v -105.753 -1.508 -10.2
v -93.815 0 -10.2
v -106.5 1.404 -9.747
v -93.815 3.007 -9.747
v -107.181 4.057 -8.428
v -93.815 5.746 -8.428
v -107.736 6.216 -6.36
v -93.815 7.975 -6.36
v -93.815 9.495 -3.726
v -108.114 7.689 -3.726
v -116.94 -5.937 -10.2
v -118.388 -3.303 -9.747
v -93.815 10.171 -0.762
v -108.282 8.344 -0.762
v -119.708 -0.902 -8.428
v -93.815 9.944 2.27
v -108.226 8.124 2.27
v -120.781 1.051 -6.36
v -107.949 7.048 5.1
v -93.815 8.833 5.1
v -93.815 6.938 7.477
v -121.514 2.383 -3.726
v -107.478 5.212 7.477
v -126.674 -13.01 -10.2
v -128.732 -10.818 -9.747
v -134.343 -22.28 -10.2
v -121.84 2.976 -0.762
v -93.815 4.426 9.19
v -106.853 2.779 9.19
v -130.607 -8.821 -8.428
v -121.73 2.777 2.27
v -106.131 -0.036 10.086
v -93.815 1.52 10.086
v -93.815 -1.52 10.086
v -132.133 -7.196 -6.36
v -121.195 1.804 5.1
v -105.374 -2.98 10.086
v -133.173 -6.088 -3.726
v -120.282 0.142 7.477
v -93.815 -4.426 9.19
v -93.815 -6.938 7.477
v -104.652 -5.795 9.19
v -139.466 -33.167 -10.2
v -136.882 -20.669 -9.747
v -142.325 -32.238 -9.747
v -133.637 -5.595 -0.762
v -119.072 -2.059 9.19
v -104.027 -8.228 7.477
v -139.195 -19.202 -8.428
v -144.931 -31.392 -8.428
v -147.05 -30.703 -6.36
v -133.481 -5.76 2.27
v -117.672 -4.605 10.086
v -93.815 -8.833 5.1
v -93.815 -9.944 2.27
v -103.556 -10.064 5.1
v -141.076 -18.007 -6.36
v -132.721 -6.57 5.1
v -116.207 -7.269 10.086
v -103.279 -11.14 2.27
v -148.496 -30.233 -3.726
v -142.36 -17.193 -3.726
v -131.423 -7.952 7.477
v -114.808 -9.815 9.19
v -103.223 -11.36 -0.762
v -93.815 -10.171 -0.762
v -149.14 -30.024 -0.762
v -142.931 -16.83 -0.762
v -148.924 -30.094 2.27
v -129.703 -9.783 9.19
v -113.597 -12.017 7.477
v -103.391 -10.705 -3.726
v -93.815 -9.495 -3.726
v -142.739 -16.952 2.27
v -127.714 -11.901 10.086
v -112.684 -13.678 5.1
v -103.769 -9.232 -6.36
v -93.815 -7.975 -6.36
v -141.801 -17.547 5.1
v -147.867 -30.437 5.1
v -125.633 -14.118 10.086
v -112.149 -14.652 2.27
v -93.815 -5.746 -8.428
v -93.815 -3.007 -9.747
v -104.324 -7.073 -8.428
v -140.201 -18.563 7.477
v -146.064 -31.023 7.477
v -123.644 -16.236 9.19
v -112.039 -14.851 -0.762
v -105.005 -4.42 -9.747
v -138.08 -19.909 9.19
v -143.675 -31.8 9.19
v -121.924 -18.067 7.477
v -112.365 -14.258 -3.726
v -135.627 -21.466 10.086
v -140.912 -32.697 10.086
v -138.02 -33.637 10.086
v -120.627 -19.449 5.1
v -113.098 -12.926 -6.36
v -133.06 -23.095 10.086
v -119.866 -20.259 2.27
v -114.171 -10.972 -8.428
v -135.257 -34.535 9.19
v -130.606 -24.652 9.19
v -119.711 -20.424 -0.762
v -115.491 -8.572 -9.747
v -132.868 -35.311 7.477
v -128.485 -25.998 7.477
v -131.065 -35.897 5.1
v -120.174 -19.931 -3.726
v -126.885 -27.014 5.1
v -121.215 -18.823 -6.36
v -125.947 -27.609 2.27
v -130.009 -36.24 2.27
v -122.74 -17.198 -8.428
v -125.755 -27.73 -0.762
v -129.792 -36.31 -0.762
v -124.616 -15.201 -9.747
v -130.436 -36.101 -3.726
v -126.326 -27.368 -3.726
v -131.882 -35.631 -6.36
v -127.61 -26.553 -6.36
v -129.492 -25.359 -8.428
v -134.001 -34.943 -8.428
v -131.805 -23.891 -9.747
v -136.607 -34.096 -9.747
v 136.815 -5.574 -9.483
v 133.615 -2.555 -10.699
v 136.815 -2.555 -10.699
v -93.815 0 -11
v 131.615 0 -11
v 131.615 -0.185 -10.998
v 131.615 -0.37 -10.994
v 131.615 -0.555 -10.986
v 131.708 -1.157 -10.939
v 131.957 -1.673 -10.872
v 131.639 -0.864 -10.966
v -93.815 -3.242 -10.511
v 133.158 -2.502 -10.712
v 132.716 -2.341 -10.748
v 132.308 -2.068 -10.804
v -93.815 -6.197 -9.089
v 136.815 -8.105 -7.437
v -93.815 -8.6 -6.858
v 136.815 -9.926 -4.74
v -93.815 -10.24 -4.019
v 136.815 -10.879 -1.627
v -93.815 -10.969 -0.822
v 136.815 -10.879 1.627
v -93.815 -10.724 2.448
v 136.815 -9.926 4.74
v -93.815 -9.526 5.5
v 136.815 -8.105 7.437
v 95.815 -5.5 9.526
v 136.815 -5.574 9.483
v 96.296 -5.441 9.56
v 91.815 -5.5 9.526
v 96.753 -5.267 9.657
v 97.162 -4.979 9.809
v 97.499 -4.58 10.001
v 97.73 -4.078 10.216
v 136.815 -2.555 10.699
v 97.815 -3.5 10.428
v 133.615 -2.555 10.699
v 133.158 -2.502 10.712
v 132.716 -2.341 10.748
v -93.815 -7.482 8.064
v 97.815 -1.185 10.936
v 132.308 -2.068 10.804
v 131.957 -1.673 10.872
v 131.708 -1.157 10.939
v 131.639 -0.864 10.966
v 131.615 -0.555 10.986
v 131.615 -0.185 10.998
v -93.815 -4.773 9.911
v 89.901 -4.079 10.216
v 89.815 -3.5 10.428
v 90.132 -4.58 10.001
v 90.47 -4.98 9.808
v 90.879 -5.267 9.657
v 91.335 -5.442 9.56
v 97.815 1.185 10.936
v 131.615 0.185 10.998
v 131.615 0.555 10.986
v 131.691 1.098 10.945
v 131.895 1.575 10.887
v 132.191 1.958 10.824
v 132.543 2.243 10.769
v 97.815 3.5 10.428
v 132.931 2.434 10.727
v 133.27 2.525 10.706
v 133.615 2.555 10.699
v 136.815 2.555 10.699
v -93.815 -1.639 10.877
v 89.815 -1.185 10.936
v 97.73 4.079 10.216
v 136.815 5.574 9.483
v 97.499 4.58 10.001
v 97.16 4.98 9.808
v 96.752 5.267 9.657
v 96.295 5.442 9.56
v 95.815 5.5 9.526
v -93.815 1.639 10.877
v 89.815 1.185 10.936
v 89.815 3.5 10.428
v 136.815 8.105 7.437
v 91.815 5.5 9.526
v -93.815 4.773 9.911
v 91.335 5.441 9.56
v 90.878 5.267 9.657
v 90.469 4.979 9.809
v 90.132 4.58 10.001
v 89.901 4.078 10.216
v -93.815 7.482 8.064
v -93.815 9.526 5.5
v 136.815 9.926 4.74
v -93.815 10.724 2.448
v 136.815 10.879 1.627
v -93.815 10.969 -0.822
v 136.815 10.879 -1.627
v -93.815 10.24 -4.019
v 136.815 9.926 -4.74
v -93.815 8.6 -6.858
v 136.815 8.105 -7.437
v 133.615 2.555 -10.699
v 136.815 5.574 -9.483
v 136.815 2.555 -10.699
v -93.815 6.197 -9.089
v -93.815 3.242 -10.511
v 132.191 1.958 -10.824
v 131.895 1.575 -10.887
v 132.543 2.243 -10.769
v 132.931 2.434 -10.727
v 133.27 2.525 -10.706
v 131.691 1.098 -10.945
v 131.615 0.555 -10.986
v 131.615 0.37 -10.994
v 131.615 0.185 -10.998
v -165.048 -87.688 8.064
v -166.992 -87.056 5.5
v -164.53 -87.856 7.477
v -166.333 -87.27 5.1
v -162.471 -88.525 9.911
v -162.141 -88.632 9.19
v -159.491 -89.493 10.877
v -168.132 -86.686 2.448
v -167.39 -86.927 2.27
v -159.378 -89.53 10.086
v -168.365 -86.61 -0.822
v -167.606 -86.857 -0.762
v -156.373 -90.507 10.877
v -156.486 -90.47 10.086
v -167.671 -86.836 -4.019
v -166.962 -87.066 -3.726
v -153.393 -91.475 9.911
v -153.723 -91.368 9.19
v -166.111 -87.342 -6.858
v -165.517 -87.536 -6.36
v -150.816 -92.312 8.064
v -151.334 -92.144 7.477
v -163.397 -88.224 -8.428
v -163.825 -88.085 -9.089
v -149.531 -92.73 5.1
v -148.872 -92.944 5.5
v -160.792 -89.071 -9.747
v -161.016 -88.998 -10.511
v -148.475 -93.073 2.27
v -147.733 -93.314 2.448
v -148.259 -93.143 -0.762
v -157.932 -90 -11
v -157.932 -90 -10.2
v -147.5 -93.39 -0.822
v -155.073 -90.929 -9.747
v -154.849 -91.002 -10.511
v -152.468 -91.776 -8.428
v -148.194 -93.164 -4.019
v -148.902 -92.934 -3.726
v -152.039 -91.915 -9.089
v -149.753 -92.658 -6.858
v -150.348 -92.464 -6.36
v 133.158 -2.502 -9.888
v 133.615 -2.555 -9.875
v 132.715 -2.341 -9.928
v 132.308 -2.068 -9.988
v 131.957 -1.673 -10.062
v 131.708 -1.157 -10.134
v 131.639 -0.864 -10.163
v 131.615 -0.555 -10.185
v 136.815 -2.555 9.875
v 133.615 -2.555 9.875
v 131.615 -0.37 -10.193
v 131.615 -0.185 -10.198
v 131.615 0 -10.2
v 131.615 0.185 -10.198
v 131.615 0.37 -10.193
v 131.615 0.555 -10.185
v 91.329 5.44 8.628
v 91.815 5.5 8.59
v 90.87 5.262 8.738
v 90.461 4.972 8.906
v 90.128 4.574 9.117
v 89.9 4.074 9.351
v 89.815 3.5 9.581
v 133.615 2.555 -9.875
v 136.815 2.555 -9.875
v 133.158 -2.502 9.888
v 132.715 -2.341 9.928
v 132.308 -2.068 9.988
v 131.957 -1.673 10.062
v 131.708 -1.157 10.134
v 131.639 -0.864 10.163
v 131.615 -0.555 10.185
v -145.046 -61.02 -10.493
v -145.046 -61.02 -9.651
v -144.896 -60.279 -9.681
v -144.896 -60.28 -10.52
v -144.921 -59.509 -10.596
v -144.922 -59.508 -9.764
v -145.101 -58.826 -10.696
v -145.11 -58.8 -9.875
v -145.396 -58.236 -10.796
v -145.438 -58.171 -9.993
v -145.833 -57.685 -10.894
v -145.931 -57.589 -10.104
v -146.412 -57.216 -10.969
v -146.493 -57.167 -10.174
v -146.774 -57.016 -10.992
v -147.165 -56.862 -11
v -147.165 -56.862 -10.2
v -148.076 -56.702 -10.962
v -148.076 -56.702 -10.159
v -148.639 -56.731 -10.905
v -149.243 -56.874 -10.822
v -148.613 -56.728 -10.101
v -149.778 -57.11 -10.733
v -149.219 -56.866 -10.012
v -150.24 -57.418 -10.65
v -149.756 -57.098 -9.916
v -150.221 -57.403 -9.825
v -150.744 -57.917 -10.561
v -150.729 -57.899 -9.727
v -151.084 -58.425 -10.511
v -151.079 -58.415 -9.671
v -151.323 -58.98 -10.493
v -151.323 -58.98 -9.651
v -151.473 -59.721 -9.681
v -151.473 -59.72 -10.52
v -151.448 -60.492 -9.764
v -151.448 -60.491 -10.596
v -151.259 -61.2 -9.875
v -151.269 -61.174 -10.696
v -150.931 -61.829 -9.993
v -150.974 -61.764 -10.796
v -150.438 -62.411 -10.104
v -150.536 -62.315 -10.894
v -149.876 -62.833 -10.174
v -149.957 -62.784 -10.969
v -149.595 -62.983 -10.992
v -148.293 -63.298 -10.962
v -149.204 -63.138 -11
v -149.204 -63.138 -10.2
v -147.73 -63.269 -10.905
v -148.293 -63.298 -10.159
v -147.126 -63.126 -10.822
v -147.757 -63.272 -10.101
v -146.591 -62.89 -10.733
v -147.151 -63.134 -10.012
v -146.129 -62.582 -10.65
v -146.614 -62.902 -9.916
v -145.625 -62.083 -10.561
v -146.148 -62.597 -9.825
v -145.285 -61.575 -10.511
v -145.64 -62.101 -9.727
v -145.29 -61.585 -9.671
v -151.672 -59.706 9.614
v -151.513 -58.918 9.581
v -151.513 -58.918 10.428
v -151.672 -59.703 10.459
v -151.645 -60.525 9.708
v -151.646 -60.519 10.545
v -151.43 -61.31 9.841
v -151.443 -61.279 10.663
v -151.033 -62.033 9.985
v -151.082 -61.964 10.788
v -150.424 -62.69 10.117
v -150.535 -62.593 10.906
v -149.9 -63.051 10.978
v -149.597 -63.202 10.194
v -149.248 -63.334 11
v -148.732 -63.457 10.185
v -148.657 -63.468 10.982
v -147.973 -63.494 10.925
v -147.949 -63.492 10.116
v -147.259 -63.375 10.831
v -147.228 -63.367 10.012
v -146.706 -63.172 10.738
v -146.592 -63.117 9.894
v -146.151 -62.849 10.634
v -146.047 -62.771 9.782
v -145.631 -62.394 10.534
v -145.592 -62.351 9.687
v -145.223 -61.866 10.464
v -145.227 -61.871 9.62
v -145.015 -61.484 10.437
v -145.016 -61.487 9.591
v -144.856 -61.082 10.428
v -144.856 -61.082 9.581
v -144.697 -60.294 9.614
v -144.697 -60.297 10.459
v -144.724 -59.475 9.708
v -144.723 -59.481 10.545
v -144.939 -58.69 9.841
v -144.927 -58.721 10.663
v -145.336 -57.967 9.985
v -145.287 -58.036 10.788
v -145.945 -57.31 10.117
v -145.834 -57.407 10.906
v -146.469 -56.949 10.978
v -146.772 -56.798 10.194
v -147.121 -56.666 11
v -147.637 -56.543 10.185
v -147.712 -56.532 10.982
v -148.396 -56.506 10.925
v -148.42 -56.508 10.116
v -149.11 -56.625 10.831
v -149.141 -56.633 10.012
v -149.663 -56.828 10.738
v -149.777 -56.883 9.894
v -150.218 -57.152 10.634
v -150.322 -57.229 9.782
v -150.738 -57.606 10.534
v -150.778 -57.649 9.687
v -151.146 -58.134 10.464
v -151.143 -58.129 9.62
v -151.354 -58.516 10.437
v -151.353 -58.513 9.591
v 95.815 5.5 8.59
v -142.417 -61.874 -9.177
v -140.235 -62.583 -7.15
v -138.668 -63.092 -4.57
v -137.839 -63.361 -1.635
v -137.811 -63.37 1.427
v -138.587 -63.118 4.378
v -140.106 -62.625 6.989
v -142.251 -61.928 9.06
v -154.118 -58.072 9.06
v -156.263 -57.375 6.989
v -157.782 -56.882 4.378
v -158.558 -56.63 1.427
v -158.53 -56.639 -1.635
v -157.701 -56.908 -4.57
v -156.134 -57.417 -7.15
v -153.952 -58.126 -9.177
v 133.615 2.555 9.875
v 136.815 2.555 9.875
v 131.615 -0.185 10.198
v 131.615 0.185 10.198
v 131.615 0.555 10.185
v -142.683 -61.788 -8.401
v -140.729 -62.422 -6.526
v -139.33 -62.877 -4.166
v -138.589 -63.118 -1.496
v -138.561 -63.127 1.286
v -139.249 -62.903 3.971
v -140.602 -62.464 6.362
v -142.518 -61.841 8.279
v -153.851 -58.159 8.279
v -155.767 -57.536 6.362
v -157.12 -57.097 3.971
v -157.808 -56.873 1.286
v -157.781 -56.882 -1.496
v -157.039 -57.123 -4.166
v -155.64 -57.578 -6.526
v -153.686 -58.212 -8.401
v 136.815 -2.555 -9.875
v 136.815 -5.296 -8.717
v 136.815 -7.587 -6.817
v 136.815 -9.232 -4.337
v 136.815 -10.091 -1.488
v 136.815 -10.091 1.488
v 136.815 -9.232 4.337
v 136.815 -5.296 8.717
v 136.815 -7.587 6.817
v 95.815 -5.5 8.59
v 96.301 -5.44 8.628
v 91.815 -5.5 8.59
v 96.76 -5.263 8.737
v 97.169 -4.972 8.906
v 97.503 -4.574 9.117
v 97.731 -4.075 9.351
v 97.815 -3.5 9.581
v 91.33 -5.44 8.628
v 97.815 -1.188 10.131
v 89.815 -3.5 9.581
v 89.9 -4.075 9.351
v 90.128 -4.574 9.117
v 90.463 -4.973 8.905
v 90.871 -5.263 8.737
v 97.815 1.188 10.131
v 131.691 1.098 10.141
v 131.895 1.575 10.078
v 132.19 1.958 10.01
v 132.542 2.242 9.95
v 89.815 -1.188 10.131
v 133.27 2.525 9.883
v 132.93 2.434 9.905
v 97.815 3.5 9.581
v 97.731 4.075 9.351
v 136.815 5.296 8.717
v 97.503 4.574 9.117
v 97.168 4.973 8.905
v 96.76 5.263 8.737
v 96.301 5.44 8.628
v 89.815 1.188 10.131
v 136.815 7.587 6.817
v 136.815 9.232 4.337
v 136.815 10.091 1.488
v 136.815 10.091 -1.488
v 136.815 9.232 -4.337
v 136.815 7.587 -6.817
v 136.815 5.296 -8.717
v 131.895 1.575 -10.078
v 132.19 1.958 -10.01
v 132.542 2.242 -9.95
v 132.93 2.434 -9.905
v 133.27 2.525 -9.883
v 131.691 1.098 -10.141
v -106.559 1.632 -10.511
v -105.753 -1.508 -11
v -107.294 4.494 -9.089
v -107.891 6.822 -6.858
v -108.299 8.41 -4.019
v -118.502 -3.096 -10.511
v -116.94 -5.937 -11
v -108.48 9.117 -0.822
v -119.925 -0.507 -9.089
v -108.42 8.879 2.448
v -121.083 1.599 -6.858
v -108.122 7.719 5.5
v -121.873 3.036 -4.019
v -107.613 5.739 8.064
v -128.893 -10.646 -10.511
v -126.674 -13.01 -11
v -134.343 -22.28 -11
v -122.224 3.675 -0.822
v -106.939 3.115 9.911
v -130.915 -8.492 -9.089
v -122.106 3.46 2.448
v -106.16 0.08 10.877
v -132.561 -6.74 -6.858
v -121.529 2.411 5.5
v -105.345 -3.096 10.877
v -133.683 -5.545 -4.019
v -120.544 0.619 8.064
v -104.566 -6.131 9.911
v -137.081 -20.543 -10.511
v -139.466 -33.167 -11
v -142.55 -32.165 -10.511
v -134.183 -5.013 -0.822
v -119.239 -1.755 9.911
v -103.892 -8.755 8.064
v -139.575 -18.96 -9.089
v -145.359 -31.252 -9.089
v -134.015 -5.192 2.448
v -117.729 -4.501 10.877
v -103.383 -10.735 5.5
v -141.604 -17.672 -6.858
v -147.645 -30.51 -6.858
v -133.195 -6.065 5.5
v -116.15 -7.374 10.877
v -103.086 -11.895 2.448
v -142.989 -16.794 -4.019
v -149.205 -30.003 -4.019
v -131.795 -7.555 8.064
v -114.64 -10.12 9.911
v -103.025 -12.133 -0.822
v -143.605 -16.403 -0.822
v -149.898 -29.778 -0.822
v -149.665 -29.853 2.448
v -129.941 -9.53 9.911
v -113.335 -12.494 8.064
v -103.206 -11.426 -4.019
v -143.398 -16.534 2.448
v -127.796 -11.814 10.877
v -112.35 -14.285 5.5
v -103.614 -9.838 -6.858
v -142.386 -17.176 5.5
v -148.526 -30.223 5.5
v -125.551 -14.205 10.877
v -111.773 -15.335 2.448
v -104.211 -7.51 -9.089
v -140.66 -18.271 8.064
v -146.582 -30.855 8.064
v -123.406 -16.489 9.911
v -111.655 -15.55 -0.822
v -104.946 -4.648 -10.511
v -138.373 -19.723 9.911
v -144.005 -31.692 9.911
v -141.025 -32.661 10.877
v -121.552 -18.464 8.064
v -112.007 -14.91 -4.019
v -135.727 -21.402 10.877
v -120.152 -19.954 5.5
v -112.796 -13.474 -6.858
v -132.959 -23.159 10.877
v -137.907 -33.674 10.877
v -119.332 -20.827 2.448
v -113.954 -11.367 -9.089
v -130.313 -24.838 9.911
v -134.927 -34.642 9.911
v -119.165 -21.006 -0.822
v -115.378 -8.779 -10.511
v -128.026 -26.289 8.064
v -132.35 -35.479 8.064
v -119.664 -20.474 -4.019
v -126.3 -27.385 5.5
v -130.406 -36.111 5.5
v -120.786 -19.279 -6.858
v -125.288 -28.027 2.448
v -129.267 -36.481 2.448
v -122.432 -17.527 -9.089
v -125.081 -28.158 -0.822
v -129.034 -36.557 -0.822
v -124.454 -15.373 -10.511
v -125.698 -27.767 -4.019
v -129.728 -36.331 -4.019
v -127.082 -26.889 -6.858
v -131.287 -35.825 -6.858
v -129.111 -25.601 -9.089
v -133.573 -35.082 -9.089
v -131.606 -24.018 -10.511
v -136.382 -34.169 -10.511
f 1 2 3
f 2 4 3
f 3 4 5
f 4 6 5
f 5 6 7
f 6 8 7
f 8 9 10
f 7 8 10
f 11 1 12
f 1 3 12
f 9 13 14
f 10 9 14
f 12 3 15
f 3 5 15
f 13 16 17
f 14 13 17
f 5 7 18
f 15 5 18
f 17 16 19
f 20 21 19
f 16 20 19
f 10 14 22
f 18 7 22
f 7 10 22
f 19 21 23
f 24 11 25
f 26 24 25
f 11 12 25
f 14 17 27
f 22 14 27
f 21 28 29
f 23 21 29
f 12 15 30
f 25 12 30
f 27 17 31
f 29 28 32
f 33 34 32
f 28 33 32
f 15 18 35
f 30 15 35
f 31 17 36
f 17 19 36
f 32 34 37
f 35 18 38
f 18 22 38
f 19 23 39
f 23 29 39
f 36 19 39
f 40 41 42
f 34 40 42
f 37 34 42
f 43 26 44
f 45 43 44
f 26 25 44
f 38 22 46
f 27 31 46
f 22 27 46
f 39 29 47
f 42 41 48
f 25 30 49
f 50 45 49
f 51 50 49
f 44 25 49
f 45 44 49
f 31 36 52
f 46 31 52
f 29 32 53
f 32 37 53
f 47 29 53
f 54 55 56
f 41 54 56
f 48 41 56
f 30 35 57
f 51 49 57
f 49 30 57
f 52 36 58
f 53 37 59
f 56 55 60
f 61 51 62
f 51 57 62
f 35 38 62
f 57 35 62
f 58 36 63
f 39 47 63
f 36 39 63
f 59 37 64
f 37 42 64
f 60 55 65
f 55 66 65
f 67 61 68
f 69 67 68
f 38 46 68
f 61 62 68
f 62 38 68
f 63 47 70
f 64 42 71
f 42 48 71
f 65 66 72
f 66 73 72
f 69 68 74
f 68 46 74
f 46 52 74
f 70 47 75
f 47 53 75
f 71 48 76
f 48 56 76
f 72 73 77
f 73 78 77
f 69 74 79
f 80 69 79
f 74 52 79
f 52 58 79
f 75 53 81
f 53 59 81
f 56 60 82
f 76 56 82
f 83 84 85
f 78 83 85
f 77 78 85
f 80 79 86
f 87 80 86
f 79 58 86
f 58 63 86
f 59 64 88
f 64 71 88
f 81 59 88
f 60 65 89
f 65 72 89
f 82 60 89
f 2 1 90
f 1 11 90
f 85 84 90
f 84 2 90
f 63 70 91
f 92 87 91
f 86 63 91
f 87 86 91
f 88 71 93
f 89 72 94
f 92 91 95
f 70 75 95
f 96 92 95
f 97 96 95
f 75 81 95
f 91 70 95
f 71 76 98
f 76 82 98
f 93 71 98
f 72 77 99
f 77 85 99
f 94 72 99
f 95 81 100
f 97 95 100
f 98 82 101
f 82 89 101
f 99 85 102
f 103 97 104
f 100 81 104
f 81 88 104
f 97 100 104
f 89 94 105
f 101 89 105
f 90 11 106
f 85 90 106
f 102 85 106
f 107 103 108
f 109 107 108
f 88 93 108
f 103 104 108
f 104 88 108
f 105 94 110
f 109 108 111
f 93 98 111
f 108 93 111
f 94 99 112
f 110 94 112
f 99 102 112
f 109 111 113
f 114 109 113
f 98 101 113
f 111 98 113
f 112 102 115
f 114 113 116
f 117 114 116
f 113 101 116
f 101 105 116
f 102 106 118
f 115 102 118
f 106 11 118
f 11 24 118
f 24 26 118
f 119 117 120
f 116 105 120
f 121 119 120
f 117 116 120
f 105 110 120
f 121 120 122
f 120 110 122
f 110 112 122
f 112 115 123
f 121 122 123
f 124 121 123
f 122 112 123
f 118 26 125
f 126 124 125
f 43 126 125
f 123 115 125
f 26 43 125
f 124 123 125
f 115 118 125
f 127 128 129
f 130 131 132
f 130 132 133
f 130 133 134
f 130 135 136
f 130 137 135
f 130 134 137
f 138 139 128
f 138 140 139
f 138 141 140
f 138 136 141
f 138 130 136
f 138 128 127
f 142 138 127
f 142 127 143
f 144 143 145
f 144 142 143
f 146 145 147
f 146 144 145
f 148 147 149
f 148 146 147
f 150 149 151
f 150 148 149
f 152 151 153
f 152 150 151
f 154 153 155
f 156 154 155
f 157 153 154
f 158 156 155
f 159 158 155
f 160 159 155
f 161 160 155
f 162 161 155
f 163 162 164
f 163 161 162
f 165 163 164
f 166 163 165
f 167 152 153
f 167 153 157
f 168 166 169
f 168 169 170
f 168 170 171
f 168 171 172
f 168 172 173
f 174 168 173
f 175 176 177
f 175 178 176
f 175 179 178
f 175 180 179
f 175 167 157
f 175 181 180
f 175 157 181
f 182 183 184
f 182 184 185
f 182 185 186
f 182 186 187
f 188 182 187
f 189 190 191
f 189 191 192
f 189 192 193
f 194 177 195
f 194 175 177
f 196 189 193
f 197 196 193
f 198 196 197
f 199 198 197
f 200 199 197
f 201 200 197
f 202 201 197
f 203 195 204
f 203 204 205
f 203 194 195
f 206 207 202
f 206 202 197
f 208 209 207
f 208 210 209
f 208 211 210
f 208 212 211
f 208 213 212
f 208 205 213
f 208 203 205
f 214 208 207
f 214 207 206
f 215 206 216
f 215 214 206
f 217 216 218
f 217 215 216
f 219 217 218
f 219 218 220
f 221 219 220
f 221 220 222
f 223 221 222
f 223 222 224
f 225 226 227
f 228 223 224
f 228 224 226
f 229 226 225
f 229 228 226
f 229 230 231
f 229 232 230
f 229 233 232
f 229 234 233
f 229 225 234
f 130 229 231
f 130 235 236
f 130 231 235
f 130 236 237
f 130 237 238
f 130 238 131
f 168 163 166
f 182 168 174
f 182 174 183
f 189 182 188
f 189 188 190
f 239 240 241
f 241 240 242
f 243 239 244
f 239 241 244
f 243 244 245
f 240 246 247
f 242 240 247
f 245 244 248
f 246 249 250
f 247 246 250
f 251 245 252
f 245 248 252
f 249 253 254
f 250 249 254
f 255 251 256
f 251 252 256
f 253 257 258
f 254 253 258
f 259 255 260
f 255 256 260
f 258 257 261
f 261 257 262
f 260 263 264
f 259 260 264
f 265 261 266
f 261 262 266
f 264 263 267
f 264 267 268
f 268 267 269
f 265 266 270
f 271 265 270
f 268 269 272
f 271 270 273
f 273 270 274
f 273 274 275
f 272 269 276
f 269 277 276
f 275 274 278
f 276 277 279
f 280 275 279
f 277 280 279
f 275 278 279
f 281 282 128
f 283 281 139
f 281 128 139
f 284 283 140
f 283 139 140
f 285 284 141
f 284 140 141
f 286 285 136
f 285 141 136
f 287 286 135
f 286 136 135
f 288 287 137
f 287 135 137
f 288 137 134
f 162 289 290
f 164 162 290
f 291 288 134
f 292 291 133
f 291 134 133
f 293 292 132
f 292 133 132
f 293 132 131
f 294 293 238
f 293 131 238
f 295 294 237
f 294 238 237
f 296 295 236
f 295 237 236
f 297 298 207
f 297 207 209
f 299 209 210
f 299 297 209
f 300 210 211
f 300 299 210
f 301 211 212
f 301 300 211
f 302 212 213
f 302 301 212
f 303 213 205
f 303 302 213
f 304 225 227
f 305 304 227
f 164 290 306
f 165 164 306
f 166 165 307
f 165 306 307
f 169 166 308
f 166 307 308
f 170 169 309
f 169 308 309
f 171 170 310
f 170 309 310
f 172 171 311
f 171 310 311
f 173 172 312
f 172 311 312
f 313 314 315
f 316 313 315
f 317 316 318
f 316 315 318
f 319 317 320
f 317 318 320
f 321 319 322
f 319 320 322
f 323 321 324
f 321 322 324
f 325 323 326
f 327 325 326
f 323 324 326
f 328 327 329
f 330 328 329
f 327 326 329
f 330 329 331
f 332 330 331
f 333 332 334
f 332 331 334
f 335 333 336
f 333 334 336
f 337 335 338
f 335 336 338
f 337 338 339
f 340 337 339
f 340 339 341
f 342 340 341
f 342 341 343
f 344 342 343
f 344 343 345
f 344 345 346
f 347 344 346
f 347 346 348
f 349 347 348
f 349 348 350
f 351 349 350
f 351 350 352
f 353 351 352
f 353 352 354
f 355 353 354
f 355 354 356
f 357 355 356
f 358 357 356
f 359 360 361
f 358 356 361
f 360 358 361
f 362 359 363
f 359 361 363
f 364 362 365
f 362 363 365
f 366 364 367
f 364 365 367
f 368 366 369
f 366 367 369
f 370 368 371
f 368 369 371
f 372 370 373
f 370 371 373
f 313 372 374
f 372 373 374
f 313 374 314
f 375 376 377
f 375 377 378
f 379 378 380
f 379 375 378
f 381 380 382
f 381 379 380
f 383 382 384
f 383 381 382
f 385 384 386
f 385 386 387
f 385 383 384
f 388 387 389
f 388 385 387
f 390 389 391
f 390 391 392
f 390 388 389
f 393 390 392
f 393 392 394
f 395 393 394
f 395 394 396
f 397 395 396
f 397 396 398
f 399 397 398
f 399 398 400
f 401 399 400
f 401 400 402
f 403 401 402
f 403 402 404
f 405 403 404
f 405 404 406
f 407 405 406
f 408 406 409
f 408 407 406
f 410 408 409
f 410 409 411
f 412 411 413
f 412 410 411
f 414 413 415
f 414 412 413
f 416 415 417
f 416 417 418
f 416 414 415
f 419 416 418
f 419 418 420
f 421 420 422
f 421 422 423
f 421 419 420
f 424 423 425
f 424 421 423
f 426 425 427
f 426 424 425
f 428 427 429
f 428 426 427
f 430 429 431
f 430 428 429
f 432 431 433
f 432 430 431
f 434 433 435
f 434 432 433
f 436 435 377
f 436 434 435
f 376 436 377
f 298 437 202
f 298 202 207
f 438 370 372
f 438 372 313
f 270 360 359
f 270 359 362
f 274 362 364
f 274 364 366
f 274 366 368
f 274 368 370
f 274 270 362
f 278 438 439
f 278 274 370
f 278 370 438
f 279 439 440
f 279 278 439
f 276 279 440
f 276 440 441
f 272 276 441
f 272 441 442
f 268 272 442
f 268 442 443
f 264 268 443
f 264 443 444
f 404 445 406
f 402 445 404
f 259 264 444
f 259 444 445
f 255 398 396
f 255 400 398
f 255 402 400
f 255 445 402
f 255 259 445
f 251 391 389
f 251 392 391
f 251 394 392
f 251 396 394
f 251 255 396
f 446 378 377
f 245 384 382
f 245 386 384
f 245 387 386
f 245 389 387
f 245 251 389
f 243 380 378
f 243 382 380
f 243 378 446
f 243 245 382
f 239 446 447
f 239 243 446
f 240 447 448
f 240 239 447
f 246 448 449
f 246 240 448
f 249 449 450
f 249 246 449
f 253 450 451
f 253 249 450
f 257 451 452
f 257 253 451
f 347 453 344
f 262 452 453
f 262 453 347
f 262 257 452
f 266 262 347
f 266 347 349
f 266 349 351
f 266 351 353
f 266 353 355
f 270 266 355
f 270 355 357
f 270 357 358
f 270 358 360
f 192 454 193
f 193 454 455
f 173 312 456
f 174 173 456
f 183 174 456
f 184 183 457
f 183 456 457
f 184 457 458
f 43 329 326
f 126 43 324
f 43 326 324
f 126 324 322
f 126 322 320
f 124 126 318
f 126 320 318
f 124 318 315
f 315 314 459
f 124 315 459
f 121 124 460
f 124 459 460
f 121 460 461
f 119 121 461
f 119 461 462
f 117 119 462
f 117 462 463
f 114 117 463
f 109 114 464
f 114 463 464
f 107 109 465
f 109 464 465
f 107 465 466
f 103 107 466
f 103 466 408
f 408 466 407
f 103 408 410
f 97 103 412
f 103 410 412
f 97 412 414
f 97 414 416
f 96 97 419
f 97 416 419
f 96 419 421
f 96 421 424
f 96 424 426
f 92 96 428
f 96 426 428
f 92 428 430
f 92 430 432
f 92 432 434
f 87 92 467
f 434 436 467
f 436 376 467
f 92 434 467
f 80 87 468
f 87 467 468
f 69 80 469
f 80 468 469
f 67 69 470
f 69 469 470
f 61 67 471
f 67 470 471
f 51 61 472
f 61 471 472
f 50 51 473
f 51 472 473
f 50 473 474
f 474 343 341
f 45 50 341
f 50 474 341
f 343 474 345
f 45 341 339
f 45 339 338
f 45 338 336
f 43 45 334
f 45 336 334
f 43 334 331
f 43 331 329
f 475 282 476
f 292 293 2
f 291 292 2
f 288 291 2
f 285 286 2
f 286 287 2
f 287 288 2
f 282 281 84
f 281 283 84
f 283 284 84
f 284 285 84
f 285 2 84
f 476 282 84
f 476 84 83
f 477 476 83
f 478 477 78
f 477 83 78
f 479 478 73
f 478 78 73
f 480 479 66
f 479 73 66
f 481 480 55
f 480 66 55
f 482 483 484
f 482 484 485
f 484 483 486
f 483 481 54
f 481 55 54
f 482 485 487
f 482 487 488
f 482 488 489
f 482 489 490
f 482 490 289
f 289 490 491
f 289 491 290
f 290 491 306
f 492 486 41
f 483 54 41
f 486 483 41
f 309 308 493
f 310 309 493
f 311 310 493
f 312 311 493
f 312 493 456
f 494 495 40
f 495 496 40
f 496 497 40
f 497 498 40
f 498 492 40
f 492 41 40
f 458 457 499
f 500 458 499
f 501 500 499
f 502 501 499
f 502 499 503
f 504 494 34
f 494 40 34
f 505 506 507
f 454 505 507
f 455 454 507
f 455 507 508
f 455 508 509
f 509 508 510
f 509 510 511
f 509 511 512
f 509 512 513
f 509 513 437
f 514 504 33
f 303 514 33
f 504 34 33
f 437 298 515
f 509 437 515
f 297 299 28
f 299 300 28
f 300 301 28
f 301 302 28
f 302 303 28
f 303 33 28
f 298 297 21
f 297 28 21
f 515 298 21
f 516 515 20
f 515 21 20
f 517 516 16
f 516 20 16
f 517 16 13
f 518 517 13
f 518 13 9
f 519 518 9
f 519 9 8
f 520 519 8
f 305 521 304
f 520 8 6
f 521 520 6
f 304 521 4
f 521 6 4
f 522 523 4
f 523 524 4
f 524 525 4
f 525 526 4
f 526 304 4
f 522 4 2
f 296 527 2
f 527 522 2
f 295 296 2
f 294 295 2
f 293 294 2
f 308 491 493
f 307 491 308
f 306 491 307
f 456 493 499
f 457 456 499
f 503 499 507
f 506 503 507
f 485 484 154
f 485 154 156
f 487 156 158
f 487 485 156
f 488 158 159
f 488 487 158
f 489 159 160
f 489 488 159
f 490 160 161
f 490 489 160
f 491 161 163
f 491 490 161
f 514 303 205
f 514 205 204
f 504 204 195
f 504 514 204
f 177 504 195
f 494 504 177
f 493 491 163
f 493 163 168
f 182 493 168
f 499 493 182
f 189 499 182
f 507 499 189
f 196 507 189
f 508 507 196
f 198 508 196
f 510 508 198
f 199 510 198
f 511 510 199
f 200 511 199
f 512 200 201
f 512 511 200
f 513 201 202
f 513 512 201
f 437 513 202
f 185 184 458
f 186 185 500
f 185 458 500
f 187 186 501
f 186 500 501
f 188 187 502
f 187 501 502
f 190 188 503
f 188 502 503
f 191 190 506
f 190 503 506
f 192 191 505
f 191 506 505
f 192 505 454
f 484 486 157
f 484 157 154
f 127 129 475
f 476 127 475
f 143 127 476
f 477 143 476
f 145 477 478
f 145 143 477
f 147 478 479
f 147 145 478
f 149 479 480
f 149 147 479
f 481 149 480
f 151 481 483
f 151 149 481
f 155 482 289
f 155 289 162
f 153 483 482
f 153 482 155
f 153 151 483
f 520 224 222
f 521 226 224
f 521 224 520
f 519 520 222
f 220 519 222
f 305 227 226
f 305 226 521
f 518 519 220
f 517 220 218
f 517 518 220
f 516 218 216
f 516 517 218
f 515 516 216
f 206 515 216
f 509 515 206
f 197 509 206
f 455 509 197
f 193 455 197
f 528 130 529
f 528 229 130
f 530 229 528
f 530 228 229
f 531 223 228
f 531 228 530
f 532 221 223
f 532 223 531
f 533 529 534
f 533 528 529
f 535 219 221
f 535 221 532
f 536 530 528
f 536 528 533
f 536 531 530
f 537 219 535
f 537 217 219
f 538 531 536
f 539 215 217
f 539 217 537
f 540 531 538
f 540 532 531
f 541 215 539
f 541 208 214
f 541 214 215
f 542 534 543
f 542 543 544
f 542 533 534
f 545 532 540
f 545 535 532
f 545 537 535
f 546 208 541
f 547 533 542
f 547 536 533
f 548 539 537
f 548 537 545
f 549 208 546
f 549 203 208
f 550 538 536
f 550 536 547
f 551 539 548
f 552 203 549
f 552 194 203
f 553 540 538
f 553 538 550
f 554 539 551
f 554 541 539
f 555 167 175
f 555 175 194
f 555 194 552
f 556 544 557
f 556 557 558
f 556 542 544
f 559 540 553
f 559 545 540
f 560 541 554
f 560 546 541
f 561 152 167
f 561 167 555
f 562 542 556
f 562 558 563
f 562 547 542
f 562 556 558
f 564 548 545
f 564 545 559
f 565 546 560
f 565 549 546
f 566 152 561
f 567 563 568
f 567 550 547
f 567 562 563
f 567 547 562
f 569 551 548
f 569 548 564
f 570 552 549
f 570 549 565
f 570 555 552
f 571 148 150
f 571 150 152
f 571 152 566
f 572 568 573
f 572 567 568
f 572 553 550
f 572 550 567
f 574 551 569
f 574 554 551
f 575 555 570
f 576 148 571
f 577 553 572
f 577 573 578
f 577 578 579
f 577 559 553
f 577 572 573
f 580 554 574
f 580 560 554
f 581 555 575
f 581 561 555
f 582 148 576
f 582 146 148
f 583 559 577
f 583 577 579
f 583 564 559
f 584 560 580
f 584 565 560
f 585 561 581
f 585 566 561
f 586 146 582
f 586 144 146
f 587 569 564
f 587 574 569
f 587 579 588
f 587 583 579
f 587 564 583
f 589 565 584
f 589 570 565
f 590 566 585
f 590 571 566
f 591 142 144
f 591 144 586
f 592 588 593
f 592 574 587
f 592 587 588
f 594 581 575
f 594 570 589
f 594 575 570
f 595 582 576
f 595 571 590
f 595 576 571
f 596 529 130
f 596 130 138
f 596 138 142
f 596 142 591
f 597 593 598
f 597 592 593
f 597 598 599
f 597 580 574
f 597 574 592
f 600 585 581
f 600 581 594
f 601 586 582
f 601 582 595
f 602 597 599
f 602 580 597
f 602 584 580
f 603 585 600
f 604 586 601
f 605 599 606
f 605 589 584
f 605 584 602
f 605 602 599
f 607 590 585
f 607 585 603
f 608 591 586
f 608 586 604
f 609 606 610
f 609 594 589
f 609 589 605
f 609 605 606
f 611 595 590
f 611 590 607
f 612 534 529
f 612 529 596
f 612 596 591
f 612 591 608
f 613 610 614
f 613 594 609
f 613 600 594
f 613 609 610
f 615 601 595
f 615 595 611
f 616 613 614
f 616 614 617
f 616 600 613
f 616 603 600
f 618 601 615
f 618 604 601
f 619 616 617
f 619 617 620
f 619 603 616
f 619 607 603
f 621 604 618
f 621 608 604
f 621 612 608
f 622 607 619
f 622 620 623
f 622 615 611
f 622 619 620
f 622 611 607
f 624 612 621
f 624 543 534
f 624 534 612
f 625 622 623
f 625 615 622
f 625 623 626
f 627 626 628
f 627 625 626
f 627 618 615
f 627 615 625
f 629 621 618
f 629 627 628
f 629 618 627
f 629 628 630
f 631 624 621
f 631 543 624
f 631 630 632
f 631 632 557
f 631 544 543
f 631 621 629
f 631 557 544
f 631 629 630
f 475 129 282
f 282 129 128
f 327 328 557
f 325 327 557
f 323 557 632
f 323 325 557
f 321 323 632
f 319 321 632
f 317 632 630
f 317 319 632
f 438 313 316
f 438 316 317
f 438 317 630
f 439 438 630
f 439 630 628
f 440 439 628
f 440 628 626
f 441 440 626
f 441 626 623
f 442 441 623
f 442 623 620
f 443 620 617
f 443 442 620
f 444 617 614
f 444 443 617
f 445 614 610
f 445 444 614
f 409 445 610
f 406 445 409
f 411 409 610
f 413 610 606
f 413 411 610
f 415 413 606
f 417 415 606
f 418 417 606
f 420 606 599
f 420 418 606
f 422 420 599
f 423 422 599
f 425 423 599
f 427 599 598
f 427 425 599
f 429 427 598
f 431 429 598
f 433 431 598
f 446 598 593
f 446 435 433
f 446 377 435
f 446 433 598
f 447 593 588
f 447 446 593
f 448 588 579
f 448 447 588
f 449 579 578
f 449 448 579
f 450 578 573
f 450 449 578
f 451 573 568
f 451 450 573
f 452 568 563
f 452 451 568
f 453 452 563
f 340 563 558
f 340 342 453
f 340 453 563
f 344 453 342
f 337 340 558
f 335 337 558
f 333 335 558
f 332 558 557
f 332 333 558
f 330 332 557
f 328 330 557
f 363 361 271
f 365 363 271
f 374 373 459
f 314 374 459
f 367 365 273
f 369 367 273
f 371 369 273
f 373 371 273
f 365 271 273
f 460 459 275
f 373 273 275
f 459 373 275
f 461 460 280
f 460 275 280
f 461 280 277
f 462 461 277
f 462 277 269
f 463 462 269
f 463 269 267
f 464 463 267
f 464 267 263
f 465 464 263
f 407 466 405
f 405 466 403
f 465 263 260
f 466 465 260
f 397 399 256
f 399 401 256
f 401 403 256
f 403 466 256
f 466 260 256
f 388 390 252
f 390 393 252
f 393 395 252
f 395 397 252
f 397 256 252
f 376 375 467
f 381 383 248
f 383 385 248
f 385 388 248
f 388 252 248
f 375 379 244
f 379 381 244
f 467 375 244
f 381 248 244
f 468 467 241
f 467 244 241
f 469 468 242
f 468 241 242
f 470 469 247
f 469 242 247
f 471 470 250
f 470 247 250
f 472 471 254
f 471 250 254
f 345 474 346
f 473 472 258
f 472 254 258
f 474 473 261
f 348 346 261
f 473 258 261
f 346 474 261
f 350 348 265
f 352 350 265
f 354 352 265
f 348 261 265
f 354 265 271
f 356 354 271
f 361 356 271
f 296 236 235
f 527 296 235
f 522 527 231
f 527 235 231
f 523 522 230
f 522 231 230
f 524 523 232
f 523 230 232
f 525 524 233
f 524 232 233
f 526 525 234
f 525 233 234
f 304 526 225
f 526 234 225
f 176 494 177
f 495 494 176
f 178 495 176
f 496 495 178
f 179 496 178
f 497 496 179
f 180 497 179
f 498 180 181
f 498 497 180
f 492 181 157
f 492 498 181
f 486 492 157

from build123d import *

# Parameters (mm, degrees)
SKETCH3_R               = 11
SKETCH3_R_2             = 10.2
CUT_EXTRUDE1_REACH      = 194.875
SKETCH4_R               = 3.5
SKETCH5_R               = 3.3
CUT_EXTRUDE2_DEPTH      = 193.875317702
CUT_EXTRUDE3_DEPTH      = 193.875317702
CUT_EXTRUDE3_DEPTH_BACK = 193.875317702


with BuildPart() as part:
    # Sweep2: sweep along a path in Sketch1
    with BuildLine(Plane.XY) as sweep2_path:
        Line((136.815388441, 0), (93.815388441, 0))
        Line((93.815388441, 0), (-93.815388441, 0))
        ThreePointArc((-93.815388441, 0), (-122.029080551, -9.16718427), (-139.466101223, -33.16718427))
        Line((-139.466101223, -33.16718427), (-148.184611559, -60))
        Line((-148.184611559, -60), (-157.932202446, -90))
    # Sketch3 → Sweep2 (sweep)
    with BuildSketch(Plane(origin=(93.815388441, 0, 0), x_dir=(0, 0, -1), z_dir=(1, 0, 0))):
        Circle(SKETCH3_R)
        Circle(SKETCH3_R_2, mode=Mode.SUBTRACT)
    sweep(path=sweep2_path.line)

    # Sketch4 → Cut-Extrude1 (cut, up to next)
    with BuildSketch(Plane.XY, mode=Mode.PRIVATE) as cut_extrude1_sk1:
        with Locations((-148.184611559, -60)):
            Circle(SKETCH4_R)
    cut_extrude1_tool1 = extrude(cut_extrude1_sk1.sketch, amount=CUT_EXTRUDE1_REACH, mode=Mode.PRIVATE) & part.part
    # Sketch4 → Cut-Extrude1 (cut, up to next)
    with BuildSketch(Plane.XY, mode=Mode.PRIVATE) as cut_extrude1_sk2:
        with BuildLine():
            Line((91.815388441, -5.5), (95.815388441, -5.5))
            ThreePointArc((95.815388441, -5.5), (97.229602003, -4.914213562), (97.815388441, -3.5))
            Line((97.815388441, -3.5), (97.815388441, 3.5))
            ThreePointArc((97.815388441, 3.5), (97.229602003, 4.914213562), (95.815388441, 5.5))
            Line((95.815388441, 5.5), (91.815388441, 5.5))
            ThreePointArc((91.815388441, 5.5), (90.401174879, 4.914213562), (89.815388441, 3.5))
            Line((89.815388441, 3.5), (89.815388441, -3.5))
            ThreePointArc((89.815388441, -3.5), (90.401174879, -4.914213562), (91.815388441, -5.5))
        make_face()
    cut_extrude1_tool2 = extrude(cut_extrude1_sk2.sketch, amount=CUT_EXTRUDE1_REACH, mode=Mode.PRIVATE) & part.part
    add(cut_extrude1_tool1.solids().sort_by_distance((-148.184612, -60, 0))[0], mode=Mode.SUBTRACT)
    add(cut_extrude1_tool2.solids().sort_by_distance((93.815388, 0, 0))[0], mode=Mode.SUBTRACT)

    # Sketch5 → Cut-Extrude2 (cut, through all)
    with BuildSketch(Plane.XY):
        with Locations((-148.184611559, -60)):
            Circle(SKETCH5_R)
    extrude(amount=-CUT_EXTRUDE2_DEPTH, mode=Mode.SUBTRACT)

    # Sketch6 → Cut-Extrude3 (cut, two sides: drawn at the far end of the back side and taken through both)
    with BuildSketch(Plane.XY.offset(-CUT_EXTRUDE3_DEPTH_BACK)):
        with BuildLine():
            Line((136.889174497, 2.554733627), (136.815388441, -2.554733627))
            Line((136.815388441, -2.554733627), (133.615388441, -2.554733627))
            ThreePointArc((133.615388441, -2.554733627), (132.201174879, -1.968947189), (131.615388441, -0.554733627))
            Line((131.615388441, -0.554733627), (131.615388441, 0.554733627))
            ThreePointArc((131.615388441, 0.554733627), (132.201174879, 1.968947189), (133.615388441, 2.554733627))
            Line((133.615388441, 2.554733627), (136.889174497, 2.554733627))
        make_face()
    extrude(amount=CUT_EXTRUDE3_DEPTH + CUT_EXTRUDE3_DEPTH_BACK, mode=Mode.SUBTRACT)


solid = part.part
